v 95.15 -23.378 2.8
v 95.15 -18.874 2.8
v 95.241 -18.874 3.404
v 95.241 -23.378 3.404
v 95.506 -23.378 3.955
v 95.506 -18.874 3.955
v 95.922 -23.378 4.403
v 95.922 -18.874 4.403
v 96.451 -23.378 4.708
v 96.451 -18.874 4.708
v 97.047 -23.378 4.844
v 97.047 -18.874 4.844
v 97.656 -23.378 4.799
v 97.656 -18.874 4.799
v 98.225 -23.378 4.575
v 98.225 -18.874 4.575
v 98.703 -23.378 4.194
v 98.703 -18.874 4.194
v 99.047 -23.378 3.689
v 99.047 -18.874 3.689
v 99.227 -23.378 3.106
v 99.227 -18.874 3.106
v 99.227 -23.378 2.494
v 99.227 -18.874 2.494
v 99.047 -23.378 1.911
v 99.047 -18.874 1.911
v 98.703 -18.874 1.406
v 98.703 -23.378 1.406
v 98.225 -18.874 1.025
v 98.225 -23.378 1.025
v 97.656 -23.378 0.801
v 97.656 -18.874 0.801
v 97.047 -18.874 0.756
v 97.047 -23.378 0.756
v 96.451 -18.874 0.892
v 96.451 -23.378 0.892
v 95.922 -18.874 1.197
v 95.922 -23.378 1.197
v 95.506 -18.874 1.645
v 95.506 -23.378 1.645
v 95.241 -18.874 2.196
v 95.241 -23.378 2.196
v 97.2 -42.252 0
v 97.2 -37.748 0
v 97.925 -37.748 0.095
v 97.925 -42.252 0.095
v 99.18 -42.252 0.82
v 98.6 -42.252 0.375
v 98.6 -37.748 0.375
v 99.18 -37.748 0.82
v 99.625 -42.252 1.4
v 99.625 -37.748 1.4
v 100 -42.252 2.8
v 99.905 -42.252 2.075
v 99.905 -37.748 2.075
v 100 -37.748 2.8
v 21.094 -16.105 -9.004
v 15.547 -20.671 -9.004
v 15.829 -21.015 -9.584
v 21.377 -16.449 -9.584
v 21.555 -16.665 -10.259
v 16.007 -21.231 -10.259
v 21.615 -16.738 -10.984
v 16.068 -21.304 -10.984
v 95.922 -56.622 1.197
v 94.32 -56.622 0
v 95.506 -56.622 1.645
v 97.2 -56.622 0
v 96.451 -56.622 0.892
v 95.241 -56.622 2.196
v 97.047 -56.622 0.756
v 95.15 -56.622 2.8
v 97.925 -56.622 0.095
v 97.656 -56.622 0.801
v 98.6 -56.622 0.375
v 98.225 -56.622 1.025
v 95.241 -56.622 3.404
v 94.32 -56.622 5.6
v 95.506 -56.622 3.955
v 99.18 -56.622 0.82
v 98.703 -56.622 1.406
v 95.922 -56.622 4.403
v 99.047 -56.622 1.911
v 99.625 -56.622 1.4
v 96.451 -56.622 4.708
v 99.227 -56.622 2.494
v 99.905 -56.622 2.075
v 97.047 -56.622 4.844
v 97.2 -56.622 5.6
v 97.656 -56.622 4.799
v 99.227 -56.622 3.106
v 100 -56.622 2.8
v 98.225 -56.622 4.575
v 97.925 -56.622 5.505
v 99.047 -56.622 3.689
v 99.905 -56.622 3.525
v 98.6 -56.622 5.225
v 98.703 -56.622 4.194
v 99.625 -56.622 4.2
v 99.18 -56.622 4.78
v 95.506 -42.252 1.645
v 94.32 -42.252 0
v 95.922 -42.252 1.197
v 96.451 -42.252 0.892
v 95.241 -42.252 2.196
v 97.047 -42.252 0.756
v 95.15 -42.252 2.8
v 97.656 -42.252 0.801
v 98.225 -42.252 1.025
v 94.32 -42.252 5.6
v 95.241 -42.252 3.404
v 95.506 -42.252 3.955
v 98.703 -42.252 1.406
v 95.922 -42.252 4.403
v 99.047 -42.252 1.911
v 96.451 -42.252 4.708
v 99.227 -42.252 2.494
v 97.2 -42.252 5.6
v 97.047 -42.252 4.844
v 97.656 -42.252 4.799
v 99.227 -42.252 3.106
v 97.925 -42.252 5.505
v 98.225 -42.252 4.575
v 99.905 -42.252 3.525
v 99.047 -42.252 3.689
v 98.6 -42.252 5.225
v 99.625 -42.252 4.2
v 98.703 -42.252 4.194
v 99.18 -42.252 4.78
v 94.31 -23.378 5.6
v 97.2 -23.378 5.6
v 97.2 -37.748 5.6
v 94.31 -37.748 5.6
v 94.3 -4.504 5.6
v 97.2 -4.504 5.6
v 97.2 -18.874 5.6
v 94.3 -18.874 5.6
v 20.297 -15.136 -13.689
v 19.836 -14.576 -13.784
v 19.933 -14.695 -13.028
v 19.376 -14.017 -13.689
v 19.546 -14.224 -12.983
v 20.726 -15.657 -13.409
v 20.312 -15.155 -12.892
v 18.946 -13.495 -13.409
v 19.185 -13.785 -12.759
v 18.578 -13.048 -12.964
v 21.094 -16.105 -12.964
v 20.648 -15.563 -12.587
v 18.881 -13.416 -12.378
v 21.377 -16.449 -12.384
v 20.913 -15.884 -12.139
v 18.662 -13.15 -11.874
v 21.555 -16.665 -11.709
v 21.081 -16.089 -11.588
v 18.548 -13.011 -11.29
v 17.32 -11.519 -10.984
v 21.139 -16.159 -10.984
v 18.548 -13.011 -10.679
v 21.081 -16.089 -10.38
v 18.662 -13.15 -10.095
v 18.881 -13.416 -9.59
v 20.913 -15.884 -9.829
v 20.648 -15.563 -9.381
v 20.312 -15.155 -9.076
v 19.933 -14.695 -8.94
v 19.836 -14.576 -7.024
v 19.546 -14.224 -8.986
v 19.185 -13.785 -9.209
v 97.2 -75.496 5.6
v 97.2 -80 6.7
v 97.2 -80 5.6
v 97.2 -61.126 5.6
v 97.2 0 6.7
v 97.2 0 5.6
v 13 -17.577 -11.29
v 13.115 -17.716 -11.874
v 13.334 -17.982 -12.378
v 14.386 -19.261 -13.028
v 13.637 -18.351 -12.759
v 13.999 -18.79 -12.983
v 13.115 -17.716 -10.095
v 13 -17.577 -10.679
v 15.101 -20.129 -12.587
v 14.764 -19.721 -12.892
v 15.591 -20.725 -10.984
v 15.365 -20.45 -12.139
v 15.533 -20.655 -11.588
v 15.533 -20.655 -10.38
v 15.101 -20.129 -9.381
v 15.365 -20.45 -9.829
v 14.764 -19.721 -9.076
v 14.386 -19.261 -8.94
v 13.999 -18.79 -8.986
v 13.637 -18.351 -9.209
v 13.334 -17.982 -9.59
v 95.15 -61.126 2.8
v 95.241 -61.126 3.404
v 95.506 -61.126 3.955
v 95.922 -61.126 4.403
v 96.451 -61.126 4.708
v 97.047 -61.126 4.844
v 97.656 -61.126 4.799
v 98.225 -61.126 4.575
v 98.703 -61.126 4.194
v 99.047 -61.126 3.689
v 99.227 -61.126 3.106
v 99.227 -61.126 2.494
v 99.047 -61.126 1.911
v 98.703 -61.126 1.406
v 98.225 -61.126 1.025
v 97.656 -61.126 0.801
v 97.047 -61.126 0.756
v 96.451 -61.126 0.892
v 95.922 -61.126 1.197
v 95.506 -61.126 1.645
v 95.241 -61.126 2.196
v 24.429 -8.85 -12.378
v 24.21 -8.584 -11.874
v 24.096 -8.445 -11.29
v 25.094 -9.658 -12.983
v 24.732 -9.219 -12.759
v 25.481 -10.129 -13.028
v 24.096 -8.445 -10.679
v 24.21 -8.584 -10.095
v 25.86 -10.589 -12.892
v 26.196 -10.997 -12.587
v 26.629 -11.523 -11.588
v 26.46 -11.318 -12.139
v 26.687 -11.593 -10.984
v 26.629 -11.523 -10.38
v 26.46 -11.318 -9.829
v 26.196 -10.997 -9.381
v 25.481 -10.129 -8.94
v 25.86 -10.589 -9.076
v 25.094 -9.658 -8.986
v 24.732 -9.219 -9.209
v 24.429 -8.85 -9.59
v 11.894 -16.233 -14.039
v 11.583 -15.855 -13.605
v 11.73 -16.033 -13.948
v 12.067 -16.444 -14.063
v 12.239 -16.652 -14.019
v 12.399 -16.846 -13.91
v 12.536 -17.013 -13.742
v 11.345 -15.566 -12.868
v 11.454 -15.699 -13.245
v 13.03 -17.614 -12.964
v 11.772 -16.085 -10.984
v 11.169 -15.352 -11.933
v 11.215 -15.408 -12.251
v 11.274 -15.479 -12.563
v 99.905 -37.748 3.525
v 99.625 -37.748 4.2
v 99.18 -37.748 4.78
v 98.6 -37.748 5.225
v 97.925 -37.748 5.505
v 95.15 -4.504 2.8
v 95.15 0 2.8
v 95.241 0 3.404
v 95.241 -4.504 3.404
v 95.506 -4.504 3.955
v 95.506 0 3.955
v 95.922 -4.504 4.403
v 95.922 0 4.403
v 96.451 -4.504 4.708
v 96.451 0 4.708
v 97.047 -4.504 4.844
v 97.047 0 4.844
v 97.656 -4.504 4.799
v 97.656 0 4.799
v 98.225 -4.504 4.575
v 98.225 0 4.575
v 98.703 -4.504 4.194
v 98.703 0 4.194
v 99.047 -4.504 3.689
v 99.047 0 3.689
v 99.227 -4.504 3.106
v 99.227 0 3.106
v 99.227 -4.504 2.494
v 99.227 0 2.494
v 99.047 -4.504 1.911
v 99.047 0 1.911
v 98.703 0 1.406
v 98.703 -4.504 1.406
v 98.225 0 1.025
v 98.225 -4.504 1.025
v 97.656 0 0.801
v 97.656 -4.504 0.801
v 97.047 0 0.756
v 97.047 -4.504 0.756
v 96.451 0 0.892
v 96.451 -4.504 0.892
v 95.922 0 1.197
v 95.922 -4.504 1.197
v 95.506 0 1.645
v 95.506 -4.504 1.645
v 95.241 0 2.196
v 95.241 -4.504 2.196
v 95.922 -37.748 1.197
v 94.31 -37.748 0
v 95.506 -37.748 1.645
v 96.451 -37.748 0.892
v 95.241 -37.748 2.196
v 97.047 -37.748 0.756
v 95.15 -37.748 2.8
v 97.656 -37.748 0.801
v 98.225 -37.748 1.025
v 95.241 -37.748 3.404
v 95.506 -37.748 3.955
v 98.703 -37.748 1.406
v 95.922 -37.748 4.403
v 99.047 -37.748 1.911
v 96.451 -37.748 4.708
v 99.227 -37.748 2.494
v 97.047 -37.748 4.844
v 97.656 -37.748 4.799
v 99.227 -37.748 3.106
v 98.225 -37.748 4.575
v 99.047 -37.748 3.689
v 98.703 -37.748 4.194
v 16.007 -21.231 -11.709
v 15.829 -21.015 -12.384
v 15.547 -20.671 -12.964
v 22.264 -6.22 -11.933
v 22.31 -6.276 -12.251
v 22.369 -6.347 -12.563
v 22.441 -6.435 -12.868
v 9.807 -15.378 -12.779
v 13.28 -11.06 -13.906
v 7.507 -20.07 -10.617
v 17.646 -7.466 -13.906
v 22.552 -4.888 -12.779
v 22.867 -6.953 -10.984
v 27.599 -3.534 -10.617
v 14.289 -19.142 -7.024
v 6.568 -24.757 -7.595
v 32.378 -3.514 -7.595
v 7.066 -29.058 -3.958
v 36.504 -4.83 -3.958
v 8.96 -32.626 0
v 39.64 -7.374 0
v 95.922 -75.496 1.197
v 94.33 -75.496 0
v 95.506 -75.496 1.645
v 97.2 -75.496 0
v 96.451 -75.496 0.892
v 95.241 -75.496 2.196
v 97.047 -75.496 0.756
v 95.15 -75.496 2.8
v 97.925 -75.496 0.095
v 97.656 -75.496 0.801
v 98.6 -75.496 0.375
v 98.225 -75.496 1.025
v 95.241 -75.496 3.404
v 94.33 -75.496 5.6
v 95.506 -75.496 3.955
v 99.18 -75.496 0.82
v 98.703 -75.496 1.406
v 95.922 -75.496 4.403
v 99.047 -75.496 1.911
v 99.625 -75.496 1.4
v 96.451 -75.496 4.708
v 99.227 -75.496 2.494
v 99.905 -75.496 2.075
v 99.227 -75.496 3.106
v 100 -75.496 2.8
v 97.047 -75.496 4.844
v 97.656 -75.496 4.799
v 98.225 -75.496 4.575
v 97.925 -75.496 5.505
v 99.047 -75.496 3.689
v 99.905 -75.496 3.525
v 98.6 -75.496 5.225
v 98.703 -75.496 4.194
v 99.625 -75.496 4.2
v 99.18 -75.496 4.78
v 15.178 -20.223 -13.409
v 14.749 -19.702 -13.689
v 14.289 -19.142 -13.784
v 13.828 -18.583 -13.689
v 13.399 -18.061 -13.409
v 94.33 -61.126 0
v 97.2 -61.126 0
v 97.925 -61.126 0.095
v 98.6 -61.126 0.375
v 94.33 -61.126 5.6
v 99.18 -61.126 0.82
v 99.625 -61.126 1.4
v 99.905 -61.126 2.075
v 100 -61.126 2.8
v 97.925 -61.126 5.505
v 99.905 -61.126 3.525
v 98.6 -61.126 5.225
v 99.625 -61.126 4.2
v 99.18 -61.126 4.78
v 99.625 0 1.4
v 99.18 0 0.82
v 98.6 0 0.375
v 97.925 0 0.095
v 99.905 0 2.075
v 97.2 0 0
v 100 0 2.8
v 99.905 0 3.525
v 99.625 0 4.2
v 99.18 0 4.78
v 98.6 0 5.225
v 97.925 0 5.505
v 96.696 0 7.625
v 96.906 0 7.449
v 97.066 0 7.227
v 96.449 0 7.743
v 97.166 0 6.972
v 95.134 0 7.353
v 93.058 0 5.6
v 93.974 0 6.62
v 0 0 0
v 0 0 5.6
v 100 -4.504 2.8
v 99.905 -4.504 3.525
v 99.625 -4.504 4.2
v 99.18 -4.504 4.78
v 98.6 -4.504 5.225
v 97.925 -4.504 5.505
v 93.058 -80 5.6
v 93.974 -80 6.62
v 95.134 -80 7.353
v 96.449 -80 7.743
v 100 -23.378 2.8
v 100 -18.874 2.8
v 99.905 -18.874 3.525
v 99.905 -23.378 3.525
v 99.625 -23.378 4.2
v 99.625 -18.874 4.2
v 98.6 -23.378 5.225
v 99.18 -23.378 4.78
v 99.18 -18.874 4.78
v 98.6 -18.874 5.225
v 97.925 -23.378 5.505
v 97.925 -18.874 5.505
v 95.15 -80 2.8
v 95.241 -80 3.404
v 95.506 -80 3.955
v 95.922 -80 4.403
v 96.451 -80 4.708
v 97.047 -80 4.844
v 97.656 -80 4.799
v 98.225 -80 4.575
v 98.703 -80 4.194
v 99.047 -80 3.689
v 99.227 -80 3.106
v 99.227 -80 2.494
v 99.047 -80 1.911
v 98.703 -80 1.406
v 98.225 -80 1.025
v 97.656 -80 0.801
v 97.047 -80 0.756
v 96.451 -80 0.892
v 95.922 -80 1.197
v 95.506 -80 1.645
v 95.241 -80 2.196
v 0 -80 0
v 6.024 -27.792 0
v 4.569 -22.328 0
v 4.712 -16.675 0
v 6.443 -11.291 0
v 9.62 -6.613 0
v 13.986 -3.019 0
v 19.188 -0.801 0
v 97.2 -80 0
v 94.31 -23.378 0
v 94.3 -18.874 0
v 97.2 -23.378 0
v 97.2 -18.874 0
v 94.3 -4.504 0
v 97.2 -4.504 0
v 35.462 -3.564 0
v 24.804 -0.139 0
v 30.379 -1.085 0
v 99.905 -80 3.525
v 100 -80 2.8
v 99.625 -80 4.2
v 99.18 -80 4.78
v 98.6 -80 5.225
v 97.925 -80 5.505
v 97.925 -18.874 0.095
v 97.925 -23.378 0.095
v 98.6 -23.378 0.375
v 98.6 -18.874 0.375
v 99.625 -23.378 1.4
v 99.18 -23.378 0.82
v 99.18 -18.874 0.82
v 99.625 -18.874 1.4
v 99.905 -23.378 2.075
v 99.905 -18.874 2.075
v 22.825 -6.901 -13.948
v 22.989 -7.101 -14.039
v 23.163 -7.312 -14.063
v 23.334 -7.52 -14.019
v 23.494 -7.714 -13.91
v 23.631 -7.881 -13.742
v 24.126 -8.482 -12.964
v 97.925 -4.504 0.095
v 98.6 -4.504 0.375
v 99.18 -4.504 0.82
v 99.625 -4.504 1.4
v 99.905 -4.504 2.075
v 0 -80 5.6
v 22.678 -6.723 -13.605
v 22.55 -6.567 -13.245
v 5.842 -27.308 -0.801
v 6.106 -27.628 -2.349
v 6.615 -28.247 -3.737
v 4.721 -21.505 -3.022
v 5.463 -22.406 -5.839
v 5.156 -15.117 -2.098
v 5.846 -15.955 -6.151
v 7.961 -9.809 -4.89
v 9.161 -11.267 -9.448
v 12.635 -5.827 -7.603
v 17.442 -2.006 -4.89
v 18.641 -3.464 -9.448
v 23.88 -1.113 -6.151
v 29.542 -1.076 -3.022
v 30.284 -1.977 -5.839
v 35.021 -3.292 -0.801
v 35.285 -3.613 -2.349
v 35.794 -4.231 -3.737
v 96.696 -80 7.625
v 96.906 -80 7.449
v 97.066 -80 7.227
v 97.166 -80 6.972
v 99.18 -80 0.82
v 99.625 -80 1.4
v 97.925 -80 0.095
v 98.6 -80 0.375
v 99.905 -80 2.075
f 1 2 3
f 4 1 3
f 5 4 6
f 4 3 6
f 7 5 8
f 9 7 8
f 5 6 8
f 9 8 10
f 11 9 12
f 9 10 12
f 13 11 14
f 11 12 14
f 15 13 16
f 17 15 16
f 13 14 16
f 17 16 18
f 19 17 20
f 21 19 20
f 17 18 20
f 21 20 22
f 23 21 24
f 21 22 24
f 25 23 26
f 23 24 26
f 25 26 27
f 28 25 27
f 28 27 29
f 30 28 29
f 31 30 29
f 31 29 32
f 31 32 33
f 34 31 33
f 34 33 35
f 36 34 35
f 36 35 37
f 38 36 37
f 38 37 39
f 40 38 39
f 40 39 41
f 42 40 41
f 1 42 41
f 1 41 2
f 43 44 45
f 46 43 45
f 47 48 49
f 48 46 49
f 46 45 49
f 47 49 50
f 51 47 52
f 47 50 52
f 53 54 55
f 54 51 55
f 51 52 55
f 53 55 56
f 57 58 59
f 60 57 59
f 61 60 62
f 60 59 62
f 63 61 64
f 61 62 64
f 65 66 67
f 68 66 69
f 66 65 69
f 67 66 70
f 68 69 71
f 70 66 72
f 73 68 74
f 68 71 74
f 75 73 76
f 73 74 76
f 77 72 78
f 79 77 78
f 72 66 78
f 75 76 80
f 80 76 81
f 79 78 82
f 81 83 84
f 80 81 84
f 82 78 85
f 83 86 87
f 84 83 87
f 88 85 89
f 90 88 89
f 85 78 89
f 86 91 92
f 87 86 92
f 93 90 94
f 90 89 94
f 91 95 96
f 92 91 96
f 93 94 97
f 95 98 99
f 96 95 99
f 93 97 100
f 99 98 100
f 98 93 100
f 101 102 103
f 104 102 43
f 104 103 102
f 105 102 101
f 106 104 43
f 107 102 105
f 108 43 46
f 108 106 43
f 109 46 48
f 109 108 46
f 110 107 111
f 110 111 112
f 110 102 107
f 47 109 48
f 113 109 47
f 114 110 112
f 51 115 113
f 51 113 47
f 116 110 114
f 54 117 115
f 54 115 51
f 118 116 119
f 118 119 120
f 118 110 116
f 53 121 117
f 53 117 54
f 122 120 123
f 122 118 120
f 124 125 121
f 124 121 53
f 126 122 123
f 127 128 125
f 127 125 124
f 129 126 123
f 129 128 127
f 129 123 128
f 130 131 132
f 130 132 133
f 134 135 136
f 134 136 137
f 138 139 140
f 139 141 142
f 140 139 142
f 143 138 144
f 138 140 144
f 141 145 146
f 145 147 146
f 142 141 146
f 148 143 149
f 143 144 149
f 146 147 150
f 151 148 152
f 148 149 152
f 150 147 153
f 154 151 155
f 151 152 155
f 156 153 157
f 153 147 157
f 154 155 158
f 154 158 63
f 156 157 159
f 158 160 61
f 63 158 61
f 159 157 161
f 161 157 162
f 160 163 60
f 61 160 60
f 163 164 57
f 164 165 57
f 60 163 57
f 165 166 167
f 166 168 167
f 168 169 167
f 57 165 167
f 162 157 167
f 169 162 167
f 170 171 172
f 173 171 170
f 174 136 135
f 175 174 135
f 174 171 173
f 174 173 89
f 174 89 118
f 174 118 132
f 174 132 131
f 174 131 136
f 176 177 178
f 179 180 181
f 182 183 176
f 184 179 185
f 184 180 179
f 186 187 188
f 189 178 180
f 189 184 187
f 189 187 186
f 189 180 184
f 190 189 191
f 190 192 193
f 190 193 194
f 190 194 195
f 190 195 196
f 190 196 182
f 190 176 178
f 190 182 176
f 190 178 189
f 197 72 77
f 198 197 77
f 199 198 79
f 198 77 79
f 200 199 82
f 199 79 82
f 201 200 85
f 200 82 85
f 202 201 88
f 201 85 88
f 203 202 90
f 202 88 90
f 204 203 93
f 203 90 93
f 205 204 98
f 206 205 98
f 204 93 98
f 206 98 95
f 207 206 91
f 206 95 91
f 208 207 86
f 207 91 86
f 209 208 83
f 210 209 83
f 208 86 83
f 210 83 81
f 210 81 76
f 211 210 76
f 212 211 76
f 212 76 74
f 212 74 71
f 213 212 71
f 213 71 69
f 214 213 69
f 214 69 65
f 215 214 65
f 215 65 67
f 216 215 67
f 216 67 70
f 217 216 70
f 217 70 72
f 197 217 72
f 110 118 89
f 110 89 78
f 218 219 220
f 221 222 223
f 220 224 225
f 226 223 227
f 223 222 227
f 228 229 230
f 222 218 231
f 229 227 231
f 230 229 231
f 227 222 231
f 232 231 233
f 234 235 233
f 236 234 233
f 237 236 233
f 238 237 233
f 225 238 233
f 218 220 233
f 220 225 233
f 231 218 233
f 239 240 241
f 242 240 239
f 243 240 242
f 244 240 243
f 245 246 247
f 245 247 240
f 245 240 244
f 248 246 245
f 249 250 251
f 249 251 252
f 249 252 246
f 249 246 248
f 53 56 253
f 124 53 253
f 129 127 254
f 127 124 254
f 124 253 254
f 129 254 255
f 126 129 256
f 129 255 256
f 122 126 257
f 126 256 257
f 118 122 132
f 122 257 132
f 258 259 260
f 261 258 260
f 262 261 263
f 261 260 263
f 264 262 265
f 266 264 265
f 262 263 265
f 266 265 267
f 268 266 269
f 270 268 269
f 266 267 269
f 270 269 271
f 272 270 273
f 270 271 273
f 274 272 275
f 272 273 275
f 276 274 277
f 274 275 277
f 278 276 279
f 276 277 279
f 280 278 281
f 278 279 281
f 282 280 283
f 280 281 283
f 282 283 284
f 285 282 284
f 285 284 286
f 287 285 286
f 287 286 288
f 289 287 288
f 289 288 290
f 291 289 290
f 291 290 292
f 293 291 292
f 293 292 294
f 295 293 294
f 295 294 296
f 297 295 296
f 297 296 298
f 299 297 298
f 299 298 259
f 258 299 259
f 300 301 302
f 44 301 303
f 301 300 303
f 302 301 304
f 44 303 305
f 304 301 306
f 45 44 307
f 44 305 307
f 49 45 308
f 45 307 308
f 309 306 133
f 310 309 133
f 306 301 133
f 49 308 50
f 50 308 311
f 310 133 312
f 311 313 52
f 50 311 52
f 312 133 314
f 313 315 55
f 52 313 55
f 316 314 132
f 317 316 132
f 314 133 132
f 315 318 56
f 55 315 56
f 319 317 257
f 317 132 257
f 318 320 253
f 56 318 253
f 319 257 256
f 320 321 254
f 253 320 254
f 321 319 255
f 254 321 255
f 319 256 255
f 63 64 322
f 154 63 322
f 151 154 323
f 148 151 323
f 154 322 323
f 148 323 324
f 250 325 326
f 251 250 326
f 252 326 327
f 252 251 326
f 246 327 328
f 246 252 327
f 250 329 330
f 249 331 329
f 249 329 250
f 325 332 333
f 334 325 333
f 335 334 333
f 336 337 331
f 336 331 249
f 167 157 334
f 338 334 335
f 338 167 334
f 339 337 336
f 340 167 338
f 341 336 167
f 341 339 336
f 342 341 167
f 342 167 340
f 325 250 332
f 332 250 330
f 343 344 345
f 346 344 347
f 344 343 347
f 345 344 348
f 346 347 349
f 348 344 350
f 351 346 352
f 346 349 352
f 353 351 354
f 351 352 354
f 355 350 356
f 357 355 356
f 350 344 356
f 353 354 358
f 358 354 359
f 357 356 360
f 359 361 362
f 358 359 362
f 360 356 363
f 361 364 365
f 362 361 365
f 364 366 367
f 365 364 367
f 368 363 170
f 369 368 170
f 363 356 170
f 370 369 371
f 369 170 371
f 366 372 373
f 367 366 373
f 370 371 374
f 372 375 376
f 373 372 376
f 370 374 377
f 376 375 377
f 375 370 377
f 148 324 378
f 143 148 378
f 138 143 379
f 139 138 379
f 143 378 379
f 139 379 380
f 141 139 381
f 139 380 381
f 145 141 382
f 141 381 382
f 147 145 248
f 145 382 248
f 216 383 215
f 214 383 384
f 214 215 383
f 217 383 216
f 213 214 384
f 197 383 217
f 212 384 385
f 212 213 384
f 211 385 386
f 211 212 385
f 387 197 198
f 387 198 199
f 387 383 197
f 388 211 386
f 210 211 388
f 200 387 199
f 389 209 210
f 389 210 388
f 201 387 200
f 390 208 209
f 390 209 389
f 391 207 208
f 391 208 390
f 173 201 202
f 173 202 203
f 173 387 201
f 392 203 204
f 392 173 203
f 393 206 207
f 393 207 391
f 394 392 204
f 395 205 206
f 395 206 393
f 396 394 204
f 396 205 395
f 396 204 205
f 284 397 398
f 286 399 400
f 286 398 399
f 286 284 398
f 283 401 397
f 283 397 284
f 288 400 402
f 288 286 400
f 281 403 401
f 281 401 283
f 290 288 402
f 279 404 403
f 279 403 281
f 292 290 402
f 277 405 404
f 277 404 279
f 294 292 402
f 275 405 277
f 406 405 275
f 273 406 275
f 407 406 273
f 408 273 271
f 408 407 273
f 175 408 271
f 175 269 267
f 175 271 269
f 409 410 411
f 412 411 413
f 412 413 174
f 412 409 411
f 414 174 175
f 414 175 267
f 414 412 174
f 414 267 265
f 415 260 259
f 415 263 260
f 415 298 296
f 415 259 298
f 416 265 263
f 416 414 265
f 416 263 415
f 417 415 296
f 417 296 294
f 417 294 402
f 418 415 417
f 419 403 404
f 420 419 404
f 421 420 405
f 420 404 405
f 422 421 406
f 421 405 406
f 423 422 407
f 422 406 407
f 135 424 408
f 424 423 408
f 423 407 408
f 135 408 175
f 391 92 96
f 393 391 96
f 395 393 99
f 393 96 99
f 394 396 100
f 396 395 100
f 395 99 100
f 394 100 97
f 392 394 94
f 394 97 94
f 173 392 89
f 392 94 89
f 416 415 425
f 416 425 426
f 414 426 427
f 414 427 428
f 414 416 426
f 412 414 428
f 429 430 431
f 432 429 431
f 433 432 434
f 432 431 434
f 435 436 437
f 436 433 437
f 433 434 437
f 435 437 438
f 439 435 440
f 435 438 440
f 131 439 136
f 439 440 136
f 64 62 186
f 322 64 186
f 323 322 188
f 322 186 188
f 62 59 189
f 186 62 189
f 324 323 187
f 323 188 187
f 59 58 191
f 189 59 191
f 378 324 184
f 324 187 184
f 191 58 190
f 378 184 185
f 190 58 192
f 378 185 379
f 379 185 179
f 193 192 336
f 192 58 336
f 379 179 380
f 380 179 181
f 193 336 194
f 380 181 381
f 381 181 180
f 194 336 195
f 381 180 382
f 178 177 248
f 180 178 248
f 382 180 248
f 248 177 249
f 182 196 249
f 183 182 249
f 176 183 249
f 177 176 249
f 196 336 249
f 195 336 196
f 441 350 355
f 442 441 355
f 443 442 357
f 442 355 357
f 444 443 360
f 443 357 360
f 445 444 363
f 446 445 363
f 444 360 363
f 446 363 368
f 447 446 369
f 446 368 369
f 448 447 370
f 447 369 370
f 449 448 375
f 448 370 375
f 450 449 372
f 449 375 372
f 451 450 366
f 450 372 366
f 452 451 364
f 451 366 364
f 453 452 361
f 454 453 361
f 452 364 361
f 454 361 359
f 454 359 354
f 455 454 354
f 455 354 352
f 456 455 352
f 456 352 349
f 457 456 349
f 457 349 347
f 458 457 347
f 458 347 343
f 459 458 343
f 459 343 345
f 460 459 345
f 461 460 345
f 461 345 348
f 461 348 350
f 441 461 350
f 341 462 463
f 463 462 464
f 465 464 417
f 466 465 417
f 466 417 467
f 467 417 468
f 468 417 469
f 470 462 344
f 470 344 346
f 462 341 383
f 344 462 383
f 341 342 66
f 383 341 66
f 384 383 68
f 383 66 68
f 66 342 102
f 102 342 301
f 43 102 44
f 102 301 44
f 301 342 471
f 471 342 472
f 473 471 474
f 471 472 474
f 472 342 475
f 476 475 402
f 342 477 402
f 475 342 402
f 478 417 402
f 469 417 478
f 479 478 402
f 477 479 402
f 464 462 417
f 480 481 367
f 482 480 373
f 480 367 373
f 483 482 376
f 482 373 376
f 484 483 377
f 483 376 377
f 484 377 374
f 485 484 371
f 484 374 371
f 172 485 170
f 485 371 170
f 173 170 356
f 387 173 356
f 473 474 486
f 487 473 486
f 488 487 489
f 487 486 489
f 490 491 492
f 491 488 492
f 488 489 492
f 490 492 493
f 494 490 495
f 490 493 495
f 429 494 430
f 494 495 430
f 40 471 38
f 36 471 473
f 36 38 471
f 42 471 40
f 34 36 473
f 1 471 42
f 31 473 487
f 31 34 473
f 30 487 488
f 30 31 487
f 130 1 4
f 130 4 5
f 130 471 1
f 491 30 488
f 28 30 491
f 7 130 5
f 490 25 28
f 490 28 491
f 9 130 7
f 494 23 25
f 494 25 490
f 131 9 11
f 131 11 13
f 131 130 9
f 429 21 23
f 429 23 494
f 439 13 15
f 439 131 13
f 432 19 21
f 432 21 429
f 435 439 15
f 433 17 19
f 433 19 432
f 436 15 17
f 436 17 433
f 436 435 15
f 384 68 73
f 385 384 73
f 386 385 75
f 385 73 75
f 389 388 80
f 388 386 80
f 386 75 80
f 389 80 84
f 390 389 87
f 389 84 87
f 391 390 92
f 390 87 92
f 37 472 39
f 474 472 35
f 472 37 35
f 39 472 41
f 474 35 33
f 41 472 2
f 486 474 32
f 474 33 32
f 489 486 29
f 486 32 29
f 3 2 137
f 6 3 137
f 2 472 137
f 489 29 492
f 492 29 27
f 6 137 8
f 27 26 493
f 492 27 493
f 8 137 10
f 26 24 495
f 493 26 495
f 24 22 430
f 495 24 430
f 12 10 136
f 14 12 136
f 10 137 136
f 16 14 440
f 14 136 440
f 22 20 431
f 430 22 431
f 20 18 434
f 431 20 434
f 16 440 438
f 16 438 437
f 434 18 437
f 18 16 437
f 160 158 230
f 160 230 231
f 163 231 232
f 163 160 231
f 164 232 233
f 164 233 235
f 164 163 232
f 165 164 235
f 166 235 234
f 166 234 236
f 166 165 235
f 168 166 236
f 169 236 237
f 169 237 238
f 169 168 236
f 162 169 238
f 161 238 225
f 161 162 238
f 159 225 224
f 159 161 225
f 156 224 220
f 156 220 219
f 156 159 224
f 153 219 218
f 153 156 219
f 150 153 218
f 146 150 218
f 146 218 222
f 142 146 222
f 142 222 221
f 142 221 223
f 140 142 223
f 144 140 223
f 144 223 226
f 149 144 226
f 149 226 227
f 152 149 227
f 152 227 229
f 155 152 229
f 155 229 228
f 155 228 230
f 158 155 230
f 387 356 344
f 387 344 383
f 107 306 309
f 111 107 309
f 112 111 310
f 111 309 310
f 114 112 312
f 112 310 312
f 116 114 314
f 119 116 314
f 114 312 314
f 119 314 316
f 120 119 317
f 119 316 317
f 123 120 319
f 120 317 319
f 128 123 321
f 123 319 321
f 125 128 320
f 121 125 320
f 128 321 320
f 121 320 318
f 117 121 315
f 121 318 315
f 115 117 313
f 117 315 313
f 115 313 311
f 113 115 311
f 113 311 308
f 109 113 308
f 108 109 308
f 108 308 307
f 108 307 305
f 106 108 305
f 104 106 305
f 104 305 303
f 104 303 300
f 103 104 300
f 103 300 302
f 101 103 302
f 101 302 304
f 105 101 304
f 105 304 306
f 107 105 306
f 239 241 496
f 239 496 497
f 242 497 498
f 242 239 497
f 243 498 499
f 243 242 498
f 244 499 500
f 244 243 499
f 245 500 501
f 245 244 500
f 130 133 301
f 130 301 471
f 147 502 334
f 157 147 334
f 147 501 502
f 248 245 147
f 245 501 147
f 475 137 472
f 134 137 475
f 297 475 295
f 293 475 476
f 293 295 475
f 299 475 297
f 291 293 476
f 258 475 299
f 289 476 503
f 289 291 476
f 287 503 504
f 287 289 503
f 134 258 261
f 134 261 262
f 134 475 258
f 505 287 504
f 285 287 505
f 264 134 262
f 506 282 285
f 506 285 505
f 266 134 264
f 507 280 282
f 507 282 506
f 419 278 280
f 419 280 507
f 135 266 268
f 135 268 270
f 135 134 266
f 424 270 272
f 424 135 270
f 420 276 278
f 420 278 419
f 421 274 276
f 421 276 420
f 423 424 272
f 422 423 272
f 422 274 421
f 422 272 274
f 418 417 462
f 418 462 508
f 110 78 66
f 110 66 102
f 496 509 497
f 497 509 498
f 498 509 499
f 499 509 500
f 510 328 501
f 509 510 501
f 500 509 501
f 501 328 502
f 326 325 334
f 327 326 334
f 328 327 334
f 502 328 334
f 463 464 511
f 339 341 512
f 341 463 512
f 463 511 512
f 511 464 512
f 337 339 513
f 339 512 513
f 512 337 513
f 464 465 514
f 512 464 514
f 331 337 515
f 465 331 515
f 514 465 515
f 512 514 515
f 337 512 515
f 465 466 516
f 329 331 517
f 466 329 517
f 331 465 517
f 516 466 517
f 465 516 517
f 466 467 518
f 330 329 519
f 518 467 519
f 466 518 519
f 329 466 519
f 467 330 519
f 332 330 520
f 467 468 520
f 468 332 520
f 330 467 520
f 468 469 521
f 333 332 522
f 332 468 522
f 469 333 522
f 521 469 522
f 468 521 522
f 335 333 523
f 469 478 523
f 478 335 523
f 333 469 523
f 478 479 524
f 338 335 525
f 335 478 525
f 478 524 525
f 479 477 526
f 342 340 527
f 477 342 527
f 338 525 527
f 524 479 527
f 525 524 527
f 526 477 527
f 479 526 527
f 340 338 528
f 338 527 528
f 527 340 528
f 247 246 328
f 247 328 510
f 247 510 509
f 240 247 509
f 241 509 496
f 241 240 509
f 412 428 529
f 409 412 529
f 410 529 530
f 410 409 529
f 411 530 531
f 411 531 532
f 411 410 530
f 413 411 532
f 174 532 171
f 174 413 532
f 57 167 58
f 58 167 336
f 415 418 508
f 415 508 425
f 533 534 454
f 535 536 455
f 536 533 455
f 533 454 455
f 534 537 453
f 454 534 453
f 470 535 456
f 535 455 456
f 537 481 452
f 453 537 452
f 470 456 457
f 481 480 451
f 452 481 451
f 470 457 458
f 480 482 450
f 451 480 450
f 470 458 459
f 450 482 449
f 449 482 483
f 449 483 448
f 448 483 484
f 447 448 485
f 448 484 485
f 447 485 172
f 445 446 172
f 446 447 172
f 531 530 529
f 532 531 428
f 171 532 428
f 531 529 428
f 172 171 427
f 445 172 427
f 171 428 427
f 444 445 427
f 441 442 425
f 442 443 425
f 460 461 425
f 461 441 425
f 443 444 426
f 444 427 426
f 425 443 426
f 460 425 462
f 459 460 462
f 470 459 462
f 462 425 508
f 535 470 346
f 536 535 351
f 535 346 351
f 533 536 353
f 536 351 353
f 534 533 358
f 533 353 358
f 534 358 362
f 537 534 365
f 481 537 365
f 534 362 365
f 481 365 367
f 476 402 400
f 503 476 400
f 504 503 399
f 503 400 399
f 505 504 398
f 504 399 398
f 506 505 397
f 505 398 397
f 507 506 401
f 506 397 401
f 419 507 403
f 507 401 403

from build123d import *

# Parameters (mm, degrees)
F0_W      = 100
F0_H      = 5.6
F1_DEPTH  = 80
F3_R      = 2.05
F4_DEPTH  = 80
F2_W      = 5.7
F2_H      = 14.37
F2_W_2    = 5.6900524584
F2_W_3    = 5.6801049167
F2_W_4    = 5.6701573751
F5_DEPTH  = 5.6
F6_DEPTH  = 80
F8_ANGLE  = 45
F10_DEPTH = 5.6
F12_DEPTH = 7.185
F11_R     = 2.05
F13_DEPTH = 14.37


with BuildPart() as f1:
    # F0 (on Front) → F1 (new body)
    with BuildSketch(Plane.XZ):
        with Locations((50, 2.8)):
            Rectangle(F0_W, F0_H)
    extrude(amount=F1_DEPTH)

    # F3 (on face) → F4 (cut)
    with BuildSketch(Plane(origin=(0, 0, 0), x_dir=(-1, 0, 0), z_dir=(0, 1, 0))):
        with BuildLine():
            ThreePointArc((-100, 2.8), (-99.1798989873, 4.7798989873), (-97.2, 5.6))
            Line((-97.2, 5.6), (-100, 5.6))
            Line((-100, 5.6), (-100, 2.8))
        make_face()
        with BuildLine():
            ThreePointArc((-97.2, 0), (-99.1798989873, 0.8201010127), (-100, 2.8))
            Line((-100, 2.8), (-100, 0))
            Line((-100, 0), (-97.2, 0))
        make_face()
        with Locations((-97.2, 2.8)):
            Circle(F3_R)
    extrude(amount=-F4_DEPTH, mode=Mode.SUBTRACT)

    # F2 (on face) → F5 (cut)
    with BuildSketch(Plane.XY.offset(5.6)):
        with Locations((97.15, -11.689)):
            Rectangle(F2_W, F2_H)
        with Locations((97.1549737708, -30.5629973786)):
            Rectangle(F2_W_2, F2_H)
        with Locations((97.1599475416, -49.4369947571)):
            Rectangle(F2_W_3, F2_H)
        with Locations((97.1649213125, -68.3109921357)):
            Rectangle(F2_W_4, F2_H)
    extrude(amount=-F5_DEPTH, mode=Mode.SUBTRACT)

    # F3 (on face) → F6 (join)
    with BuildSketch(Plane(origin=(0, 0, 0), x_dir=(-1, 0, 0), z_dir=(0, 1, 0))):
        with BuildLine():
            ThreePointArc((-96.4487730361, 7.7432436768), (-96.9926506427, 7.3427867688), (-97.2, 6.7))
            ThreePointArc((-97.2, 6.7), (-96.8778174593, 5.9221825407), (-96.1, 5.6))
            Line((-96.1, 5.6), (-94.4, 5.6))
            Line((-94.4, 5.6), (-93.0575369646, 5.6))
            ThreePointArc((-93.0575369646, 5.6), (-94.5287785908, 7.0266507051), (-96.4487730361, 7.7432436768))
        make_face()
        with BuildLine():
            ThreePointArc((-96.1, 5.6), (-96.8778174593, 5.9221825407), (-97.2, 6.7))
            Line((-97.2, 6.7), (-97.2, 5.6))
            Line((-97.2, 5.6), (-96.1, 5.6))
        make_face()
    extrude(amount=-F6_DEPTH)

    # F7 (on face) → F8 (revolve)
    with BuildSketch(Plane(origin=(0, 0, 0), x_dir=(1, 0, 0), z_dir=(0, 0, -1))):
        with BuildLine():
            Line((39.6402182962, 7.3743059291), (8.9597817038, 32.6256940709))
            ThreePointArc((8.9597817038, 32.6256940709), (11.6743059291, 4.6597817038), (39.6402182962, 7.3743059291))
        make_face()
    revolve(axis=Axis((24.3, -20, 0), (-0.7721136423, -0.6354844793, 0)), revolution_arc=F8_ANGLE)

    # F9 (on face) → F10 (join)
    with BuildSketch(Plane(origin=(9.8133247181, -11.9231895325, -15.442272846), x_dir=(0.8933530871, 0.274620552, 0.3556737467), z_dir=(0.4493553846, -0.5459667923, -0.7071067812))):
        Polygon((8.4025323119, 2.4046372142), (11.2193246755, 7.2446455593), (5.0094211114, 10.8586907615), (2.1926287478, 6.0186824164), align=None)
    extrude(amount=F10_DEPTH)

    # F11 (on face) → F12 (cut)
    with BuildSketch(Plane(origin=(-0.874285956, -0.7195769186, 0), x_dir=(0.6354844793, -0.7721136423, 0), z_dir=(-0.7721136423, -0.6354844793, 0))):
        with BuildLine():
            ThreePointArc((25.8401079833, -12.9640336579), (23.8602089959, -13.7841346706), (21.8803100086, -12.9640336579))
            Line((21.8803100086, -12.9640336579), (23.8602089959, -14.9439326453))
            Line((23.8602089959, -14.9439326453), (25.8401079833, -12.9640336579))
        make_face()
        with BuildLine():
            Line((27.8200069706, -10.9841346706), (25.8401079833, -9.0042356833))
            ThreePointArc((25.8401079833, -9.0042356833), (26.447071687, -9.91262106), (26.6602089959, -10.9841346706))
            ThreePointArc((26.6602089959, -10.9841346706), (26.447071687, -12.0556482812), (25.8401079833, -12.9640336579))
            Line((25.8401079833, -12.9640336579), (27.8200069706, -10.9841346706))
        make_face()
    extrude(amount=-F12_DEPTH, mode=Mode.SUBTRACT)

    # F11 (on face) → F13 (join)
    with BuildSketch(Plane(origin=(-0.874285956, -0.7195769186, 0), x_dir=(0.6354844793, -0.7721136423, 0), z_dir=(-0.7721136423, -0.6354844793, 0))):
        with BuildLine():
            ThreePointArc((21.1024925493, -12.1862161986), (19.9483442634, -11.9304113338), (19.228840788, -12.8683927535))
            ThreePointArc((19.228840788, -12.8683927535), (19.4976789162, -13.4271515153), (19.8336101906, -13.9483381152))
            ThreePointArc((19.8336101906, -13.9483381152), (20.5013555296, -14.0497518637), (21.1024925493, -13.7418511172))
            ThreePointArc((21.1024925493, -13.7418511172), (21.42467509, -12.9640336579), (21.1024925493, -12.1862161986))
        make_face()
        with BuildLine():
            Line((19.9004110213, -10.9841346706), (18.8602089959, -10.9841346706))
            ThreePointArc((18.8602089959, -10.9841346706), (18.9532322771, -11.9441239832), (19.228840788, -12.8683927535))
            ThreePointArc((19.228840788, -12.8683927535), (19.9483442634, -11.9304113338), (21.1024925493, -12.1862161986))
            Line((21.1024925493, -12.1862161986), (19.9004110213, -10.9841346706))
        make_face()
        with BuildLine():
            Line((21.8803100086, -12.9640336579), (21.1024925493, -12.1862161986))
            ThreePointArc((21.1024925493, -12.1862161986), (21.42467509, -12.9640336579), (21.1024925493, -13.7418511172))
            Line((21.1024925493, -13.7418511172), (21.8803100086, -12.9640336579))
        make_face()
        with Locations((23.8602089959, -10.9841346706)):
            Circle(F11_R)
    extrude(amount=-F13_DEPTH)


solid = f1.part
